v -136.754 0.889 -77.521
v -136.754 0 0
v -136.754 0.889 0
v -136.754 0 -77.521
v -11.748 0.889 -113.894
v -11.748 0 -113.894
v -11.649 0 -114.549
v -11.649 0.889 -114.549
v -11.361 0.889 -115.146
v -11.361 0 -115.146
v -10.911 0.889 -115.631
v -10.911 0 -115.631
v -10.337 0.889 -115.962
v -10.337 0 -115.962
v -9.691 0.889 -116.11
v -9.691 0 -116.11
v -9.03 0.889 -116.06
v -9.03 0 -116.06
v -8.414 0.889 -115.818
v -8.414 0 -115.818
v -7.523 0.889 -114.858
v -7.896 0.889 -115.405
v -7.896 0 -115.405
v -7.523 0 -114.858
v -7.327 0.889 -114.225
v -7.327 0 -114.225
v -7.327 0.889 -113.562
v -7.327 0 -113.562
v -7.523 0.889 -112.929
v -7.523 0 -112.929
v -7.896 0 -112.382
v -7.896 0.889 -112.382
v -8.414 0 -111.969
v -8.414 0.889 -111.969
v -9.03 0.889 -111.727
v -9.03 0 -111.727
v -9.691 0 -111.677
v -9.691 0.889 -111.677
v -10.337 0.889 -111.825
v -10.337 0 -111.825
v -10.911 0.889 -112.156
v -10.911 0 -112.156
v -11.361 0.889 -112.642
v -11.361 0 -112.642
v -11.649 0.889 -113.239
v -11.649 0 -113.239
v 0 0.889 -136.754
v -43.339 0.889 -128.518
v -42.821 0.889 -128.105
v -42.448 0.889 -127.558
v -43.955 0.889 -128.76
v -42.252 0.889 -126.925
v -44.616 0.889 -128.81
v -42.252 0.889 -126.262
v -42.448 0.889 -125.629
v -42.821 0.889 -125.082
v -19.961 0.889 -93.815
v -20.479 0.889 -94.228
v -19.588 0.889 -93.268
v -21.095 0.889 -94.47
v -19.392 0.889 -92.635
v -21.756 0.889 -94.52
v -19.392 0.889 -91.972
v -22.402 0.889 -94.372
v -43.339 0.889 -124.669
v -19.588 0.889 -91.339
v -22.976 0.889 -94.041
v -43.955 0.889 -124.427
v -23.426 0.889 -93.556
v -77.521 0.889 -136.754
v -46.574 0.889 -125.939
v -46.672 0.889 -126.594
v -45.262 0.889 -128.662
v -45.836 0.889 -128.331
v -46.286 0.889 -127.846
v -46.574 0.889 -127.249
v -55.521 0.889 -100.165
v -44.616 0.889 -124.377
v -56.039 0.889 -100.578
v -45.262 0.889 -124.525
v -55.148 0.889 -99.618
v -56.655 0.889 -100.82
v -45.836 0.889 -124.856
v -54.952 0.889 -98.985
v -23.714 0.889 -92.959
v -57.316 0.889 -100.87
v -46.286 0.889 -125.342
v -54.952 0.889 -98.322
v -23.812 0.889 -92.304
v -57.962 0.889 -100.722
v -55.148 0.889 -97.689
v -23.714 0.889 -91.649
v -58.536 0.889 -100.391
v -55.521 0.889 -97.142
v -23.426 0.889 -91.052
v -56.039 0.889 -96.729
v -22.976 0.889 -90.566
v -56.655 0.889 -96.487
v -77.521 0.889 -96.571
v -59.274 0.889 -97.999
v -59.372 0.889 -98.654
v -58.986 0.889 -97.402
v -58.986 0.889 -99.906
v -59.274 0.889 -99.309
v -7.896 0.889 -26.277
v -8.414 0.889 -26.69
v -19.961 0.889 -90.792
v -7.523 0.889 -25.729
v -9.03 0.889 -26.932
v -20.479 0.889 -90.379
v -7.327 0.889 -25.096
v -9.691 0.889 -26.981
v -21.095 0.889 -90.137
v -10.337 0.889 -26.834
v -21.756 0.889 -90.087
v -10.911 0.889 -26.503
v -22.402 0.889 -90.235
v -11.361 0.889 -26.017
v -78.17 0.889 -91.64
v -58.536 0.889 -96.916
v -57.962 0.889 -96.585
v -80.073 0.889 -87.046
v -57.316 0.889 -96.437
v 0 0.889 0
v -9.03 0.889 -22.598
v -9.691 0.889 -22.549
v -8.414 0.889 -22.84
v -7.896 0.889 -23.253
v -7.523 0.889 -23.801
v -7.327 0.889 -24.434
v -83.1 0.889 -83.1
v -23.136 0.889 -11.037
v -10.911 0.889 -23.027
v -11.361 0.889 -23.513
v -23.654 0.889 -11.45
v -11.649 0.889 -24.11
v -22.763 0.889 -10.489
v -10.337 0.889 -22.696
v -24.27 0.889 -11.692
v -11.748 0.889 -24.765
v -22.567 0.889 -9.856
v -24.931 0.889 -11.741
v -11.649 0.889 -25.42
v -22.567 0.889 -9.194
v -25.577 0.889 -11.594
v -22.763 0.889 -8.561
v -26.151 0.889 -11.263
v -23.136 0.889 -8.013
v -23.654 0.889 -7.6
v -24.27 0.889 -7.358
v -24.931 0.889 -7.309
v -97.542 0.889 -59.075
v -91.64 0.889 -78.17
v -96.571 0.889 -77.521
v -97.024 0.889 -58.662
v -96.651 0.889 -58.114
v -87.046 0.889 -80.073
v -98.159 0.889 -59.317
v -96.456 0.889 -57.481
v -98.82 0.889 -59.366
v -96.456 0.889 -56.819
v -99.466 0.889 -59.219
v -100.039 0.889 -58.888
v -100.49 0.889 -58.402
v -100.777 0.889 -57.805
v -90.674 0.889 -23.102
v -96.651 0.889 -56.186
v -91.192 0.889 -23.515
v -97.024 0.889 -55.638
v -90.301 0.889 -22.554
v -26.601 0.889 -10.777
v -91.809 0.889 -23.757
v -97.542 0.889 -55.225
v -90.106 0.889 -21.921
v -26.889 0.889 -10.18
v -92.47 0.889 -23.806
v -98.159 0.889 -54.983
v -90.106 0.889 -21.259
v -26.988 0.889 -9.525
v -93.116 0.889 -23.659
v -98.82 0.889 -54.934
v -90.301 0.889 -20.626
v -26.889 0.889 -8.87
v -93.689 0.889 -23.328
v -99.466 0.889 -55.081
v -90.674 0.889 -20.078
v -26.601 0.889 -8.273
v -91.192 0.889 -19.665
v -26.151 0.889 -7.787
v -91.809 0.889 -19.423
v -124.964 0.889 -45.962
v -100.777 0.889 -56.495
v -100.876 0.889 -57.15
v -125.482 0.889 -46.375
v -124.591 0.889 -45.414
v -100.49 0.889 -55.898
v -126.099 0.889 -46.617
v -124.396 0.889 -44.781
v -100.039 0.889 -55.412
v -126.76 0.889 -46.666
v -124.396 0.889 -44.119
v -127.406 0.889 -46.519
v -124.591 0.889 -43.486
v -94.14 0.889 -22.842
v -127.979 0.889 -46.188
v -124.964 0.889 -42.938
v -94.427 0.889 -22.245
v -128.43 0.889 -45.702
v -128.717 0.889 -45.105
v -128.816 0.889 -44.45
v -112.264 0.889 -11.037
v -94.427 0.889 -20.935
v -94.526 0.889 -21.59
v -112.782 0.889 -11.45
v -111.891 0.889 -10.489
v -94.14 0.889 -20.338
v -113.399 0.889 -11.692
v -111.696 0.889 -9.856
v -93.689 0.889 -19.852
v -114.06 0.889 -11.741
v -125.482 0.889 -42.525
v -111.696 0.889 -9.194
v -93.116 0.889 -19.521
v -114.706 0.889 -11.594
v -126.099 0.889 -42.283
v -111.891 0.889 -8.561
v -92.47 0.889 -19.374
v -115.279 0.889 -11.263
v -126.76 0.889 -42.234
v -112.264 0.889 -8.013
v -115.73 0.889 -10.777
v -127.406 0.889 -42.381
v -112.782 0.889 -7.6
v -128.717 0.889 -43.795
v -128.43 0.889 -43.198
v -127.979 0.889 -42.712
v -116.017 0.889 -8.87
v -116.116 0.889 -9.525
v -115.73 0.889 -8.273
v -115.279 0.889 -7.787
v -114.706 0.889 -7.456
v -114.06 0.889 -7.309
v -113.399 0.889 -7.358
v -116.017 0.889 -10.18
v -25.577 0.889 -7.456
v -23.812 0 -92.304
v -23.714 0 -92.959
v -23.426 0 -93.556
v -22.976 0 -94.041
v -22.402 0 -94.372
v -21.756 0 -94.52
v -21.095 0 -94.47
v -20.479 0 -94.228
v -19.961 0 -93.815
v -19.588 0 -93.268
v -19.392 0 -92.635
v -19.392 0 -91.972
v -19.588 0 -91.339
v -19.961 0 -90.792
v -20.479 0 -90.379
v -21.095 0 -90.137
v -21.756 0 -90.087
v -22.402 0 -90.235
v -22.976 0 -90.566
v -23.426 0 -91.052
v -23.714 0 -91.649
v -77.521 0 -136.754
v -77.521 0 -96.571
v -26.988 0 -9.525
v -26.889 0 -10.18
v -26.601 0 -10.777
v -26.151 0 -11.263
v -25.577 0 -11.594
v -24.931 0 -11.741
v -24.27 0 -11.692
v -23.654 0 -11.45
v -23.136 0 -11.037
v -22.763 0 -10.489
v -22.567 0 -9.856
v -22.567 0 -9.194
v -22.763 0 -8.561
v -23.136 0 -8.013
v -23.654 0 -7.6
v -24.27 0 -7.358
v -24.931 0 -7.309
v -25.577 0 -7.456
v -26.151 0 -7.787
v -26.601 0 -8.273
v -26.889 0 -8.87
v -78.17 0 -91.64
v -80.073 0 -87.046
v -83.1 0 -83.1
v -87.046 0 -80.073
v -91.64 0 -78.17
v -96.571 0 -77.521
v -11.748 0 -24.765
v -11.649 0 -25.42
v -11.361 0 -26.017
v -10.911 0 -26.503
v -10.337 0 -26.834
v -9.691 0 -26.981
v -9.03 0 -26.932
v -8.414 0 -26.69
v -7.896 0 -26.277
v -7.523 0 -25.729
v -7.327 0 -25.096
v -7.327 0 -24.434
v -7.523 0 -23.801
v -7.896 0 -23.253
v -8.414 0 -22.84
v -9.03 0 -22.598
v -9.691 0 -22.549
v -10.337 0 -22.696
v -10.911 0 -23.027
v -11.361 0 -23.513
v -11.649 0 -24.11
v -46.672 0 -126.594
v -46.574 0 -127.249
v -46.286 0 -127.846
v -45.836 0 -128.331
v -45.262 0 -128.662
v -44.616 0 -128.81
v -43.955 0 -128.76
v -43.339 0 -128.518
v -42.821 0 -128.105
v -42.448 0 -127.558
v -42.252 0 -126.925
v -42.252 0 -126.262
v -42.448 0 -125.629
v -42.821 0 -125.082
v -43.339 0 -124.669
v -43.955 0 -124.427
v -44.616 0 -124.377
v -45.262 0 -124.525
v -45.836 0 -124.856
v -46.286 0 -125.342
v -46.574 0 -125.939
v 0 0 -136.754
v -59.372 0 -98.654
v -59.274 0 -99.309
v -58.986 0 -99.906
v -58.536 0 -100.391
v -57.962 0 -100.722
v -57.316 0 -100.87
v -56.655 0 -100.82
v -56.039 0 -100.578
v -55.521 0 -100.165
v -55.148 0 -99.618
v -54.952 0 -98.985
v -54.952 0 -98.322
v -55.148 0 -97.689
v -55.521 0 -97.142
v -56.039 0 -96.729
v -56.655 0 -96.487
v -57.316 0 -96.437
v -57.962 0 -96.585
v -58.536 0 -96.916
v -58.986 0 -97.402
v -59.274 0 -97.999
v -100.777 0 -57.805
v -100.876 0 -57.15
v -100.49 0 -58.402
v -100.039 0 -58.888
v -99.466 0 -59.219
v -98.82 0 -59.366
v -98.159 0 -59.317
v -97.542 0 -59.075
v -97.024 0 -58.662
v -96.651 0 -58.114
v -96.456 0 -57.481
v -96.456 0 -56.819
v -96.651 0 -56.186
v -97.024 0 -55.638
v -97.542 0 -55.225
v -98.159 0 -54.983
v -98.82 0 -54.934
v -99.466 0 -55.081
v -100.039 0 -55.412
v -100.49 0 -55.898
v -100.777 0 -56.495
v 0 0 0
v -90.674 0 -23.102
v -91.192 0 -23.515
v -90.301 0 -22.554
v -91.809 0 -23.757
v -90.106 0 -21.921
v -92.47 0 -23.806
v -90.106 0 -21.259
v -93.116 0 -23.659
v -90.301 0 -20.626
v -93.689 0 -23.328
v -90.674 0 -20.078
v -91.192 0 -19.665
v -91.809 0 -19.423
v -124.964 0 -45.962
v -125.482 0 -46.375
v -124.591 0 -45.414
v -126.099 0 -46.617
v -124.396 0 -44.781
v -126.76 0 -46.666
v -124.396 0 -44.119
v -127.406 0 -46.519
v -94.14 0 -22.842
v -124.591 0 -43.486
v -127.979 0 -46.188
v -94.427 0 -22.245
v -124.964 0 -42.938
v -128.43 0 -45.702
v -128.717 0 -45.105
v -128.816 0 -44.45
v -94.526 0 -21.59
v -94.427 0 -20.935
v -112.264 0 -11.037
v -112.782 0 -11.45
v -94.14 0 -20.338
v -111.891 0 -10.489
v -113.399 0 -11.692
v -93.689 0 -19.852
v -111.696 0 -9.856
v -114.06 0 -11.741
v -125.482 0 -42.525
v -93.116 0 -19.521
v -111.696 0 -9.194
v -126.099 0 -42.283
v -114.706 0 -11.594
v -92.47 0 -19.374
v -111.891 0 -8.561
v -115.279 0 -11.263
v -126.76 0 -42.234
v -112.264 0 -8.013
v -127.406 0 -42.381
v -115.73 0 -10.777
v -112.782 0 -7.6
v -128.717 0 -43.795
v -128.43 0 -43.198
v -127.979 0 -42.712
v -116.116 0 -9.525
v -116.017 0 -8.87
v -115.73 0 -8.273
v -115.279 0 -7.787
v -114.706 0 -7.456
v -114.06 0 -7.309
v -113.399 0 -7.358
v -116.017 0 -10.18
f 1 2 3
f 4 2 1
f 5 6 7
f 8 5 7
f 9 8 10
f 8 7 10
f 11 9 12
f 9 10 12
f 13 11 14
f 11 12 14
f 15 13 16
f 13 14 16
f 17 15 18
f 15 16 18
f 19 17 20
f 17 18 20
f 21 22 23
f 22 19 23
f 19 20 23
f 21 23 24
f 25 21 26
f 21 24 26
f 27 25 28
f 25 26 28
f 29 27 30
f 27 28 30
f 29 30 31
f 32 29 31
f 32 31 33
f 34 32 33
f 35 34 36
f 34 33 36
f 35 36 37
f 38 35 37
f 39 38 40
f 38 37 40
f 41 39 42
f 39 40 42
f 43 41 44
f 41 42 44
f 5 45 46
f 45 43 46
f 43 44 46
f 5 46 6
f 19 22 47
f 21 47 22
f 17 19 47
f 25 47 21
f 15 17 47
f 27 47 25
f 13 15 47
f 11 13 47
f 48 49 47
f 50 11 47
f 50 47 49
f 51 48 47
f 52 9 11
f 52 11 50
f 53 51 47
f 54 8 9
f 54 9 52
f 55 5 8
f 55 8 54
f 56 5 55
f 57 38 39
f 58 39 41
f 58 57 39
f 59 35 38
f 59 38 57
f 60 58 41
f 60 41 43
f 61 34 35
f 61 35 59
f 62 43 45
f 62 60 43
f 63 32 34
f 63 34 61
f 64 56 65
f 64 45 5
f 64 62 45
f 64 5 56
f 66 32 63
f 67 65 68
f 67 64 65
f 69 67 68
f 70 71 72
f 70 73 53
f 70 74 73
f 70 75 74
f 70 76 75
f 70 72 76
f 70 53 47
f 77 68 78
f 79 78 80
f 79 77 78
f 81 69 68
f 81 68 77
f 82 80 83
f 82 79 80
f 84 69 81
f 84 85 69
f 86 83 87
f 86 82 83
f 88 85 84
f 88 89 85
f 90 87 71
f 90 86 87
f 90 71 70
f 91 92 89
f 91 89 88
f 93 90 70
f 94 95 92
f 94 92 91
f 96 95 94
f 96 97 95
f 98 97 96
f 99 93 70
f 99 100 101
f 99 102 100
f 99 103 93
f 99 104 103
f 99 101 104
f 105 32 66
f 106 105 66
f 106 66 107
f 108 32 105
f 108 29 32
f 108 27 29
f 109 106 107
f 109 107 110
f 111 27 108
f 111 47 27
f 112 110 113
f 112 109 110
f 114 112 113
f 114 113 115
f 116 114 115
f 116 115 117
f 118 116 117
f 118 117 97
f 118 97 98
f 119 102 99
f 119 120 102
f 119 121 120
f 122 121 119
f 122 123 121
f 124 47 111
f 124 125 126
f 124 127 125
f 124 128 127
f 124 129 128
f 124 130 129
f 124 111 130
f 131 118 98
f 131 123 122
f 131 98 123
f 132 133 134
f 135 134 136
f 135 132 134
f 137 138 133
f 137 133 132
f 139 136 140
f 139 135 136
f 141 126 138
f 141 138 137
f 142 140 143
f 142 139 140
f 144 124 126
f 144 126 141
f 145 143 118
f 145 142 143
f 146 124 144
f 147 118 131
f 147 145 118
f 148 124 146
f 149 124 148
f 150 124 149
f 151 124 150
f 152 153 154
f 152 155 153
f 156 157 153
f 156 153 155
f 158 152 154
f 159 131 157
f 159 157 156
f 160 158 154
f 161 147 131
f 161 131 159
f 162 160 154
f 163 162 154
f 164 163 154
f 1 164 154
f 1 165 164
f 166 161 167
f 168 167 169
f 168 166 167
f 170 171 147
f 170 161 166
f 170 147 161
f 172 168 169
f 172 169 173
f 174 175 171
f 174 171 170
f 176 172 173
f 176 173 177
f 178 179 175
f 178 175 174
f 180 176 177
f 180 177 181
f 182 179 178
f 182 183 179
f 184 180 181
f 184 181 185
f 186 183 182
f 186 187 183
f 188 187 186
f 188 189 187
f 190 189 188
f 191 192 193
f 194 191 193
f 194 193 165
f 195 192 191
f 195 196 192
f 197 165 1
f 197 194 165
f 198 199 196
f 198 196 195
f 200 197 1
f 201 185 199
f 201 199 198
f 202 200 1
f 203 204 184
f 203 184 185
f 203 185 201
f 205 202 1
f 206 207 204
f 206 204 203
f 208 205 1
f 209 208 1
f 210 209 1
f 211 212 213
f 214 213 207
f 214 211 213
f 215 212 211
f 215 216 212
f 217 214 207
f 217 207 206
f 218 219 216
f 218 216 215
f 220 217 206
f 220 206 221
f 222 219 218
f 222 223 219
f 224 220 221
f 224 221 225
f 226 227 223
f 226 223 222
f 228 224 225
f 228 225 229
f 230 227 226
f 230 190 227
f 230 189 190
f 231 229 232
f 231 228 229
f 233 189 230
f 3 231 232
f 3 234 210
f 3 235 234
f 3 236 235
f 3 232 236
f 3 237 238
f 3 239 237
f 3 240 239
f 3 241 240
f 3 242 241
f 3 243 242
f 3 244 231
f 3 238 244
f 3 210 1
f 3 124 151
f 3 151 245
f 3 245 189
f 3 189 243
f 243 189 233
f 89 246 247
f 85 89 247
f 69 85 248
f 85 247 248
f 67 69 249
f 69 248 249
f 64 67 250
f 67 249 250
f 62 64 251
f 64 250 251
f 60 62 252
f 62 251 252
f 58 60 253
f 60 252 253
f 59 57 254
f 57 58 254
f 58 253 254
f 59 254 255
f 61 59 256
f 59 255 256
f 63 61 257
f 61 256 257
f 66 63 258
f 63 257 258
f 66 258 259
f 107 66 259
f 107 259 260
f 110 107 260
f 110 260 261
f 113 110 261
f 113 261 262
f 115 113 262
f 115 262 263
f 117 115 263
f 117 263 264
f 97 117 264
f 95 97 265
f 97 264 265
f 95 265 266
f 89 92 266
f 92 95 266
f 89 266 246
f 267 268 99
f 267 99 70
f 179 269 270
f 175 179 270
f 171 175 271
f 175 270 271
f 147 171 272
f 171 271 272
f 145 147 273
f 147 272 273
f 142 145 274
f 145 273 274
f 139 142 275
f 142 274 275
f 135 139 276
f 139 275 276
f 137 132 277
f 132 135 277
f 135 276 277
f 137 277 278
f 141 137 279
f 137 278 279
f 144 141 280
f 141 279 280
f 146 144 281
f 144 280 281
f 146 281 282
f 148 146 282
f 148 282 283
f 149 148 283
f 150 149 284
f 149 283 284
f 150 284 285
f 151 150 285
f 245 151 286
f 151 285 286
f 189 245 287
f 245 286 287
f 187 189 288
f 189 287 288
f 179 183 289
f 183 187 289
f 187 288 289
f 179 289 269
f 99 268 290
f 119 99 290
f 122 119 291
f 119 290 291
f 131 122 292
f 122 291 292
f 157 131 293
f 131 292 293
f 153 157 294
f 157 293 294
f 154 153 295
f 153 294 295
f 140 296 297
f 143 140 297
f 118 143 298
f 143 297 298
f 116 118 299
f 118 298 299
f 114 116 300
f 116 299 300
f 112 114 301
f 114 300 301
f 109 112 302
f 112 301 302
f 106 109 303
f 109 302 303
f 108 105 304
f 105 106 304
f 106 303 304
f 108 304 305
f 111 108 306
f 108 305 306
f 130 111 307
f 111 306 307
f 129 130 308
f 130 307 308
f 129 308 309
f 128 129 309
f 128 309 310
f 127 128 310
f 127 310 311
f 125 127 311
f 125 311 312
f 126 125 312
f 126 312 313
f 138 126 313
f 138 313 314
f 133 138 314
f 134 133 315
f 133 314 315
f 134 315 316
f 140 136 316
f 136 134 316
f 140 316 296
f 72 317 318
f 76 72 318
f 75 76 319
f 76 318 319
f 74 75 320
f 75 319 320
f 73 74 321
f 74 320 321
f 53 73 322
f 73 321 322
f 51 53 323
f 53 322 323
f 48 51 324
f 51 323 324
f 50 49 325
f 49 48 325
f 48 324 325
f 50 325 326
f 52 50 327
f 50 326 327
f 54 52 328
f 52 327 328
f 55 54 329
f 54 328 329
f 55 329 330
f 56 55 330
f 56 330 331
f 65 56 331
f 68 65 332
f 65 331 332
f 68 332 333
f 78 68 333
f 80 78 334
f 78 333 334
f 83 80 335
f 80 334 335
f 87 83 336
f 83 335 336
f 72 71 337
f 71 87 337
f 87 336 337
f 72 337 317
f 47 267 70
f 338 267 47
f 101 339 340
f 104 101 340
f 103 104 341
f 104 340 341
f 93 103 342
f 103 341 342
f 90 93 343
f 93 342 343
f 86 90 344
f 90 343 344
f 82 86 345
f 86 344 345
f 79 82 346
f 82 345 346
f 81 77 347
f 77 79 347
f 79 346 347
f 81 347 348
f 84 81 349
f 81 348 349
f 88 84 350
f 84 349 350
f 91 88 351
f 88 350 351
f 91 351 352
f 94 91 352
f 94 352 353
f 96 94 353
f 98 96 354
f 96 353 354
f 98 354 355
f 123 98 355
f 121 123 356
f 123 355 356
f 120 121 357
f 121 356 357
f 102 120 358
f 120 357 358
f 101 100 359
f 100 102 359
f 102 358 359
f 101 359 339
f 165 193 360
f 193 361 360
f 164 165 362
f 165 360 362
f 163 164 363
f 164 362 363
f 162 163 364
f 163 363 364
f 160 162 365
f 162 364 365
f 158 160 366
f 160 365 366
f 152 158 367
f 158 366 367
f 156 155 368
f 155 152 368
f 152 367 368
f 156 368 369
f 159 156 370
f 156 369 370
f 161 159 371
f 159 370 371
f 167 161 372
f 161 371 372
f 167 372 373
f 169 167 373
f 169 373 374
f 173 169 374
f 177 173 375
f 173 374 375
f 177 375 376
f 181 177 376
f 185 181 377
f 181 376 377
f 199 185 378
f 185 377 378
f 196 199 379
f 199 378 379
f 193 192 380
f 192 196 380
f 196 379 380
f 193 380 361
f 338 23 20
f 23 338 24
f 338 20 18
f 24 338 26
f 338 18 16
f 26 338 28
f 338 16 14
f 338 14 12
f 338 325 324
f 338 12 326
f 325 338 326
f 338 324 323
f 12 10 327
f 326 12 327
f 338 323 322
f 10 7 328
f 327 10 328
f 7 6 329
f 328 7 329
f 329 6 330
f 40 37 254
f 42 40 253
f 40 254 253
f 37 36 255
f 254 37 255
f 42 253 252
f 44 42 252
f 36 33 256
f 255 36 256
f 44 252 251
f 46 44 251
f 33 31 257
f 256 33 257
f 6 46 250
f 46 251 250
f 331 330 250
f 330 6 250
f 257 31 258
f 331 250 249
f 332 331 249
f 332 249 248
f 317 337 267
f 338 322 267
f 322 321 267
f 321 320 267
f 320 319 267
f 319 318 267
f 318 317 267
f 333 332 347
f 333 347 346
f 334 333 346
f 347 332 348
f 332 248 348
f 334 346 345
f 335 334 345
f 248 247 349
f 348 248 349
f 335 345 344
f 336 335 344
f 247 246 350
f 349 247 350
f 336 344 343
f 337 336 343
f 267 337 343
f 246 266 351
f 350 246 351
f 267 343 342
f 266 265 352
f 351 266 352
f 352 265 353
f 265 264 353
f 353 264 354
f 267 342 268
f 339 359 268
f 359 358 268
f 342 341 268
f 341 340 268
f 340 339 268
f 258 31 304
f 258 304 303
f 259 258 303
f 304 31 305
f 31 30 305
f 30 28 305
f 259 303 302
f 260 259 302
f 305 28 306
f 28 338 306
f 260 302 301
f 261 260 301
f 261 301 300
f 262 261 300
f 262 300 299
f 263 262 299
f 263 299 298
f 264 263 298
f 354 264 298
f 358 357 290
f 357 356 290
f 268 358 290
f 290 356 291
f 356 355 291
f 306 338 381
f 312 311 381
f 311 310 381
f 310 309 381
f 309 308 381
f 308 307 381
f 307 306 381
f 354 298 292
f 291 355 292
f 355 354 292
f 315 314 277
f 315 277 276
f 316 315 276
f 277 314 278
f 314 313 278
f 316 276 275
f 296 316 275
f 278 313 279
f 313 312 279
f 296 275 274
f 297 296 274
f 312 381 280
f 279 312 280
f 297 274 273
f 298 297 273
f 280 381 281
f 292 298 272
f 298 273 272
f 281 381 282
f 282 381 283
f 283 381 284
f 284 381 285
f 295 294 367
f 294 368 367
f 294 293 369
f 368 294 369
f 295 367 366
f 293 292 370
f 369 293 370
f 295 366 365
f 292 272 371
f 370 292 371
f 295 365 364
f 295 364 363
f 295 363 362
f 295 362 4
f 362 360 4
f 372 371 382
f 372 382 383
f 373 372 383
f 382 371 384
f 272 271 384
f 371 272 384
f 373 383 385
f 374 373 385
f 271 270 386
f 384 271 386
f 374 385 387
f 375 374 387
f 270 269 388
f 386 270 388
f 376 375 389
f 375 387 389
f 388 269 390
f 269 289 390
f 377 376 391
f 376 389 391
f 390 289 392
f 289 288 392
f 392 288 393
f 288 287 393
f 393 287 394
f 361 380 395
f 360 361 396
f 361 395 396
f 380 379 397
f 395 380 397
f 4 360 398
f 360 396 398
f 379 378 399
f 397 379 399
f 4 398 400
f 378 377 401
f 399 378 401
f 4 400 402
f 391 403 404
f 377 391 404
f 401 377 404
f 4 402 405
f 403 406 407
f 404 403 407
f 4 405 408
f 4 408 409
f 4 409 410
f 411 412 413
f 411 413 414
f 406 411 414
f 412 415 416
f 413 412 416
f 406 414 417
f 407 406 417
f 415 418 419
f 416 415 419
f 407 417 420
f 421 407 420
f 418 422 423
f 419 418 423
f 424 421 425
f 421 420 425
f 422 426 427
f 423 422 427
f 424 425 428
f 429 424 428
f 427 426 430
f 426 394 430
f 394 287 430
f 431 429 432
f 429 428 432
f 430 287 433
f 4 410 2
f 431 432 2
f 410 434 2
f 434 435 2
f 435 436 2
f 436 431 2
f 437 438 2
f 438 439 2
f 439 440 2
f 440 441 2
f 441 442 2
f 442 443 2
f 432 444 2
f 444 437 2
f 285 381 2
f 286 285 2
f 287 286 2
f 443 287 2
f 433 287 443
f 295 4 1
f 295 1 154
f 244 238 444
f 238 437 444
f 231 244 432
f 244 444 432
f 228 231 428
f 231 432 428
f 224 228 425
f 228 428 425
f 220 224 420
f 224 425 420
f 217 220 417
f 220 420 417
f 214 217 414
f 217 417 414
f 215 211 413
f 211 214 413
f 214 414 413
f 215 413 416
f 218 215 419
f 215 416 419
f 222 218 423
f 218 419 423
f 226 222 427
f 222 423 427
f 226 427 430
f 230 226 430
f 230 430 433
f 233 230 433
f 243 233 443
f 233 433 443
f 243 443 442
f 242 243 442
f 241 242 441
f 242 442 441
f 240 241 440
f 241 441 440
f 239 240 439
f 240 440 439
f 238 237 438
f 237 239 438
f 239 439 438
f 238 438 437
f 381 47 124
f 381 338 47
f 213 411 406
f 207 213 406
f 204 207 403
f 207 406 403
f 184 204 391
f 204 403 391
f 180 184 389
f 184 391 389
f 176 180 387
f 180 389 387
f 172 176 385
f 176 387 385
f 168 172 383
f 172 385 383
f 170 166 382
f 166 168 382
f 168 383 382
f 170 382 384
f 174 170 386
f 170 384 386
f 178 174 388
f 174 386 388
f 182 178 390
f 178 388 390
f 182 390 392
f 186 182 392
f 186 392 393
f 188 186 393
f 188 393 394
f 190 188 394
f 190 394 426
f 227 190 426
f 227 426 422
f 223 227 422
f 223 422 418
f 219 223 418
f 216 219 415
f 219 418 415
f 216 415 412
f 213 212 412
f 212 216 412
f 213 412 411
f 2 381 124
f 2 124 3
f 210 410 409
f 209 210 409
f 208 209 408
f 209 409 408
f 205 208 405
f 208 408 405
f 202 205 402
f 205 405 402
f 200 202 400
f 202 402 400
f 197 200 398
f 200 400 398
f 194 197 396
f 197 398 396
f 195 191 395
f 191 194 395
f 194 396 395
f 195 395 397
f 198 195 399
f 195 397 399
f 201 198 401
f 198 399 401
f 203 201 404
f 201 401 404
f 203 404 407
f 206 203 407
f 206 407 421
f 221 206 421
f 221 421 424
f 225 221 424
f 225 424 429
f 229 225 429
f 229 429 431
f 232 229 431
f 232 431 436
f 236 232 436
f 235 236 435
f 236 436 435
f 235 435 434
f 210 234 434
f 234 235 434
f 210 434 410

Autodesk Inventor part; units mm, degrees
ref_plane "YZ Plane" through (0, 0, 0) normal (1, 0, 0) x (0, 1, 0)
ref_plane "XZ Plane" through (0, 0, 0) normal (0, 1, 0) x (-1, 0, 0)
ref_plane "XY Plane" through (0, 0, 0) normal (0, 0, 1) x (1, 0, 0)
sketch "Sketch1" plane through (0, 0, 0) normal (0, 1, 0) x (-1, 0, 0)
  line L0 (0, 0) -> (136.7536, 0)
  line L1 (136.7536, 0) -> (136.7536, -77.5208)
  line L2 (136.7536, -77.5208) -> (96.5708, -77.5208)
  line L3 (77.5208, -96.5708) -> (77.5208, -136.7536)
  line L4 (77.5208, -136.7536) -> (0, -136.7536)
  line L5 (0, -136.7536) -> (0, 0)
  arc A0 (96.5708, -77.5208) -> (77.5208, -96.5708) centre (96.5708, -96.5708) ccw
  circle A1 centre (9.525, -24.765) radius 2.2225
  circle A2 centre (24.765, -9.525) radius 2.2225
  circle A3 centre (9.525, -113.8936) radius 2.2225
  circle A4 centre (113.8936, -9.525) radius 2.2225
  circle A5 centre (126.5936, -44.45) radius 2.2225
  circle A6 centre (98.6536, -57.15) radius 2.2225
  circle A7 centre (92.3036, -21.59) radius 2.2225
  circle A8 centre (44.45, -126.5936) radius 2.2225
  circle A9 centre (57.15, -98.6536) radius 2.2225
  circle A10 centre (21.59, -92.3036) radius 2.2225
  line L6 (0, 0) -> (96.5708, -96.5708) construction
  dimension "d0" = 136.7536
  dimension "d1" = 77.5208
  dimension "d2" = 19.05
  dimension "d3" = 9.525
  dimension "d6" = 9.525
  dimension "d7" = 22.86
  dimension "d8" = 10.16
  dimension "d9" = 44.45
  dimension "d10" = 4.445
  dimension "d11" = 24.765
  dimension "d12" = 38.1
  dimension "d13" = 57.15
  dimension "d14" = 21.59
  dimension "d15" = 44.45
extrude "Extrusion1" add sketch "Sketch1" along normal blind 0.889
ref_plane "Work Plane1" through (0, 0, 0) normal (0.7071, 0, -0.7071) x (-0.7071, 0, -0.7071)
properties part number "NickBracket"
